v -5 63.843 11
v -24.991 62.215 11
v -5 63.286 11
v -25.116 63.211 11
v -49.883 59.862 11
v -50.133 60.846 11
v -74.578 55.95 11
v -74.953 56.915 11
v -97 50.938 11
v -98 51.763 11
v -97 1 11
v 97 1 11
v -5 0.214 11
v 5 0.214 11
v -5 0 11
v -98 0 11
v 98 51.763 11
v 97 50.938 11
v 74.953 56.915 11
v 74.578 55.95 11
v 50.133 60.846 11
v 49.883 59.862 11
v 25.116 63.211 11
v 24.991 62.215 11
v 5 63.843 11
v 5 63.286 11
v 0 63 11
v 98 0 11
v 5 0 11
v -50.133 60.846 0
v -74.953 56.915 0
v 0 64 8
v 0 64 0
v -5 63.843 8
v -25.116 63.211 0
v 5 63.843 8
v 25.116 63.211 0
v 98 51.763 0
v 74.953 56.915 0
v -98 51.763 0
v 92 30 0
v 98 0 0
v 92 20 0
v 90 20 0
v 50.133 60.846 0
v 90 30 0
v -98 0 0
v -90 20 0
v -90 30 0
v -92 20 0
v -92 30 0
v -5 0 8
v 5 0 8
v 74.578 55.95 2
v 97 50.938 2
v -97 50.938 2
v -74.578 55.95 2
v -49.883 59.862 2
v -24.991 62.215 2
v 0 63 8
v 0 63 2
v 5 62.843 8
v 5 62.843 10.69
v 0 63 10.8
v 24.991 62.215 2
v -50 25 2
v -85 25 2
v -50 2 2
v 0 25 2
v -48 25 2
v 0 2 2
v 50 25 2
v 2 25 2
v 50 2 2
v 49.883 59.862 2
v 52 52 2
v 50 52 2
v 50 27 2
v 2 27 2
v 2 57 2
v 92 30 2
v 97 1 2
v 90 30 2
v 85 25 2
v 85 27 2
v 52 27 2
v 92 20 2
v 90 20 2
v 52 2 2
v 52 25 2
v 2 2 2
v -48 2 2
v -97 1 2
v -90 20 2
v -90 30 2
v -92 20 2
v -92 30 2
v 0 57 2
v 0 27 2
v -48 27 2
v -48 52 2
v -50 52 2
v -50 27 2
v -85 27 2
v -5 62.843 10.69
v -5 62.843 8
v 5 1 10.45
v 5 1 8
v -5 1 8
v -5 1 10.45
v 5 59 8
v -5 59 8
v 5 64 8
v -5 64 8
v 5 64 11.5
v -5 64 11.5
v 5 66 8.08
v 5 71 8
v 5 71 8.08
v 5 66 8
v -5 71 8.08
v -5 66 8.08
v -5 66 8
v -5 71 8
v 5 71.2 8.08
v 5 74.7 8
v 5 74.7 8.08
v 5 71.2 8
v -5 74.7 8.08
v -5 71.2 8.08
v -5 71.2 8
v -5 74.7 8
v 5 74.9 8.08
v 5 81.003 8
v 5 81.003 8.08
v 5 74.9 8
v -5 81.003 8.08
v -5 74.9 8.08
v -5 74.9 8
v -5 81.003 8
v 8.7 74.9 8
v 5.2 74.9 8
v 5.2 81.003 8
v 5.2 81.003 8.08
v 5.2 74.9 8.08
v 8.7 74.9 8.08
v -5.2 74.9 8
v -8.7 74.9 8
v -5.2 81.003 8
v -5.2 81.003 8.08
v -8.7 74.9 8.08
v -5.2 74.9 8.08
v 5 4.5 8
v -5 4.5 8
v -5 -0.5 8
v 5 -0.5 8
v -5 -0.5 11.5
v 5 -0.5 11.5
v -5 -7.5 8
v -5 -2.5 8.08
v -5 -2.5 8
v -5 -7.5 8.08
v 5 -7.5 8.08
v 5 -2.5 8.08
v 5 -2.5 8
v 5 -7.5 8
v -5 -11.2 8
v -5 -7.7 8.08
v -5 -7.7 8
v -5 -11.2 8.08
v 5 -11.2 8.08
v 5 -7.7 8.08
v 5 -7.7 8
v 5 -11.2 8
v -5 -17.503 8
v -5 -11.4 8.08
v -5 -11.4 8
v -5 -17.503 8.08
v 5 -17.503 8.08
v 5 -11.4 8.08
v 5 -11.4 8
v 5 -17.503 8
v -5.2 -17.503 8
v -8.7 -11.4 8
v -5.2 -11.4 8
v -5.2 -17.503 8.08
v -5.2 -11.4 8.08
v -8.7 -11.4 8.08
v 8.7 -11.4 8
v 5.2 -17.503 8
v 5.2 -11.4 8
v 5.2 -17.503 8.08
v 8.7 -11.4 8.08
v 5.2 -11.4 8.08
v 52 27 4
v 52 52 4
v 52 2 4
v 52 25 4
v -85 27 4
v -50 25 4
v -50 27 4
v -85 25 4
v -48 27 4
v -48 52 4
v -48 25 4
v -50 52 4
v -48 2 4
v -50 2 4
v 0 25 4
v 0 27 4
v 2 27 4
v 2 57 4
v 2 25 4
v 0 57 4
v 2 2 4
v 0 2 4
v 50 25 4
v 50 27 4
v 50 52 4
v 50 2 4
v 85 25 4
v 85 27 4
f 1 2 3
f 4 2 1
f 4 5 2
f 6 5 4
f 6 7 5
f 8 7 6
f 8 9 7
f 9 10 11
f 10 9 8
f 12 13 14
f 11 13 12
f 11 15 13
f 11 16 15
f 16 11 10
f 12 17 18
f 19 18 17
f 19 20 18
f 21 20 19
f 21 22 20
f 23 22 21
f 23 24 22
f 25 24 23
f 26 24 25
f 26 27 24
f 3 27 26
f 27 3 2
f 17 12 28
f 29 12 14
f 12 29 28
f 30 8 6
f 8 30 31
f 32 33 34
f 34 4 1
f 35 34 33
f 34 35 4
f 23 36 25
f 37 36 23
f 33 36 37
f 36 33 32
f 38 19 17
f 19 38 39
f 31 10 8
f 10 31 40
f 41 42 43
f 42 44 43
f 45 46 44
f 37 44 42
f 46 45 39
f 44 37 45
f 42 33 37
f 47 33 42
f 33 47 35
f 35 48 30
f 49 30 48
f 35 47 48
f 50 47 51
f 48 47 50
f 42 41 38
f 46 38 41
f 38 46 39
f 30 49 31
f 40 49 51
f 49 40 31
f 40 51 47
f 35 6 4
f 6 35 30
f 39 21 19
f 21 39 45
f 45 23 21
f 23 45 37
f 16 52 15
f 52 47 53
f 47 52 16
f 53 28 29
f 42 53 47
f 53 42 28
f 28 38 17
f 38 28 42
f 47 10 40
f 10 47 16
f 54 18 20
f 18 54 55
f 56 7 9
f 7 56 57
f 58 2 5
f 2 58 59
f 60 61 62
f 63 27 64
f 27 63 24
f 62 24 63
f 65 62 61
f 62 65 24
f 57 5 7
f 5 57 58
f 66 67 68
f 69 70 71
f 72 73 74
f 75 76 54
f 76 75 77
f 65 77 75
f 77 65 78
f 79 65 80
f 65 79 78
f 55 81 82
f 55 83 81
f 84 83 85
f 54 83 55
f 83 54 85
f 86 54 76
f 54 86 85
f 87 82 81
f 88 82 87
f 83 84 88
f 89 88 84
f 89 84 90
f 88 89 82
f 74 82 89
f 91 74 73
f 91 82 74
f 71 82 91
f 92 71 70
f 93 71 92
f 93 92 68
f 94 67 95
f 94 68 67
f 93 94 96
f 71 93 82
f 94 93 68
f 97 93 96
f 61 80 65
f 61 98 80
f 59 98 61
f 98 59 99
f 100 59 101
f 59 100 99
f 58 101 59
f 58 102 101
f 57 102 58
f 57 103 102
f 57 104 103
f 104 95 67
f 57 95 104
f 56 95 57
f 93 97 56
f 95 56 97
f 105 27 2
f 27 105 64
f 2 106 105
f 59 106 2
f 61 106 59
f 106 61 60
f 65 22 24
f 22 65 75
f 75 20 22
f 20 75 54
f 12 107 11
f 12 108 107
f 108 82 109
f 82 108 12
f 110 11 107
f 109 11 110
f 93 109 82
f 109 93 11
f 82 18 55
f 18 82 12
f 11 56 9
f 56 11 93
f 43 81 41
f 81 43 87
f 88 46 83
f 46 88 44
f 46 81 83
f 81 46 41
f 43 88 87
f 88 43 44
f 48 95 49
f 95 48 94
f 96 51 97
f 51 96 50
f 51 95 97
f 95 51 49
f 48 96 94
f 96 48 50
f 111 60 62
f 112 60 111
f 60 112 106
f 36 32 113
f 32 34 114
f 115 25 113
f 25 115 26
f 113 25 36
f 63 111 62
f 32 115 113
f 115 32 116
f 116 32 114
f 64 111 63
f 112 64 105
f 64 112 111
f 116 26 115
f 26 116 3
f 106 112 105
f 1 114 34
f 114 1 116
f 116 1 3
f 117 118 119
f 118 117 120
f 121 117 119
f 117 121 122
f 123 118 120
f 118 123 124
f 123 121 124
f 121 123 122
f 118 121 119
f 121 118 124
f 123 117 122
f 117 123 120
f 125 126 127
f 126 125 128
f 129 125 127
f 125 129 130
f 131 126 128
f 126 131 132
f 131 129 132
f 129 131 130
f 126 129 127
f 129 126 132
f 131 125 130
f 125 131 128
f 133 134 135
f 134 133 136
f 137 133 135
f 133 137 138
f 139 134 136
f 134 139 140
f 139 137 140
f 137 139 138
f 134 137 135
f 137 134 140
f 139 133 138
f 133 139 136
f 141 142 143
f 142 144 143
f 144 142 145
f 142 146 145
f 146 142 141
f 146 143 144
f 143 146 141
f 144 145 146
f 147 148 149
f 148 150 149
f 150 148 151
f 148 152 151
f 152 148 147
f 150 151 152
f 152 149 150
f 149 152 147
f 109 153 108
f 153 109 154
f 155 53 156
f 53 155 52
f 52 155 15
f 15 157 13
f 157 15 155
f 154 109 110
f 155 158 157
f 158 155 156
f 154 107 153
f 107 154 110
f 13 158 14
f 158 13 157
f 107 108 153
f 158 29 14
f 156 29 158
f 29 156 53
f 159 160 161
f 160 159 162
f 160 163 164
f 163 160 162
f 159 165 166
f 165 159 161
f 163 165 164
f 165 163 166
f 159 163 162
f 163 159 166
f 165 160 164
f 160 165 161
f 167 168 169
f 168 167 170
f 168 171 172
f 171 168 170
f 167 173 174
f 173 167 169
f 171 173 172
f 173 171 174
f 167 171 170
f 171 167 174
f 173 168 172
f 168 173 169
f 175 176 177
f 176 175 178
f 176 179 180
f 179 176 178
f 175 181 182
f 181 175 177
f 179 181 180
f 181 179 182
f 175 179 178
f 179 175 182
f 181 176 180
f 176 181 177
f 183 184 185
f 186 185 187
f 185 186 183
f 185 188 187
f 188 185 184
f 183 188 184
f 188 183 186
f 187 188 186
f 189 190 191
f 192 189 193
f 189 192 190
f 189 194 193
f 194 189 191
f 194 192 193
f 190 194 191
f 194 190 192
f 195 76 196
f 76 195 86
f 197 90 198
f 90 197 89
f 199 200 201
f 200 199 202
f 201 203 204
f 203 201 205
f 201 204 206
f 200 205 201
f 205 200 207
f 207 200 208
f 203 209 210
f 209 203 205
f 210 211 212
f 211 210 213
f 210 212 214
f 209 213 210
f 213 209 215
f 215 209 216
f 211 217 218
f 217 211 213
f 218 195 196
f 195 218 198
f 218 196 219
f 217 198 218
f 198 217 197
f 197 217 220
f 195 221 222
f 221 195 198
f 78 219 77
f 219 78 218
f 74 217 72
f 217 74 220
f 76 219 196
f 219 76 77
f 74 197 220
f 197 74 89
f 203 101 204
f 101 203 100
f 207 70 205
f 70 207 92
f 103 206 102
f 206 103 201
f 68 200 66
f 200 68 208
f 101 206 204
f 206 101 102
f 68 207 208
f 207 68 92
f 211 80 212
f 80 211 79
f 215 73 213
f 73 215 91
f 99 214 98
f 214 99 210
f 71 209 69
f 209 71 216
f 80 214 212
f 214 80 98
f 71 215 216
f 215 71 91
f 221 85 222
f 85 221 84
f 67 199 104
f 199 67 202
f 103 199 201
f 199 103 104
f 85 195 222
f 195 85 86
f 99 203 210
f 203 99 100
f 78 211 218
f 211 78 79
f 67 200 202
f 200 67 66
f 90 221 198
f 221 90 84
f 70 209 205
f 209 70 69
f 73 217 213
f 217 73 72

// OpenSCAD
// Longitud de cuerda
c = 193/2;
// Longitud de semi-cuerda
a = 97;
// Distancia entre cuerda y borde exterior
b = 24;
// ancho total
d = 64;

// grosor
g = 2;

// Calculo del radio
// La pendiente de la semicuerda es c/b
// r^2 = c^2 + (c * c/b)^2
r = sqrt(c*c + ((c*c/b)*(c*c/b)));

module base(rad,grueso){
    difference(){
        translate([0,-rad+d-grueso/2,0]) difference(){
            cylinder(h=11, r=rad, center=false, $fn=100);
            translate([-1.5*rad,-rad-d+grueso,-5]) cube([3*rad,2*rad,30]);
        }
        union(){
        translate([98-grueso/2,-5,-5]) cube([400,80,60]);
        translate([-400-(98-grueso/2),-5,-5]) cube([400,80,60]);
        }
    }
}

module prism(l, w, h){
       polyhedron(
               points=[[0,0,0], [l,0,0], [l,w,0], [0,w,0], [0,w,h], [l,w,h]],
               faces=[[0,1,2,3],[5,4,3,2],[0,4,5,1],[0,3,4],[5,2,1]]
               );
       
       // preview unfolded (do not include in your function
       z = 0.08;
       separation = 2;
       border = .2;
       translate([0,w+separation,0])
           cube([l,w,z]);
       translate([0,w+separation+w+border,0])
           cube([l,h,z]);
       translate([0,w+separation+w+border+h+border,0])
           cube([l,sqrt(w*w+h*h),z]);
       translate([l+border,w+separation+w+border+h+border,0])
           polyhedron(
                   points=[[0,0,0],[h,0,0],[0,sqrt(w*w+h*h),0], [0,0,z],[h,0,z],[0,sqrt(w*w+h*h),z]],
                   faces=[[0,1,2], [3,5,4], [0,3,4,1], [1,4,5,2], [2,5,3,0]]
                   );
       translate([0-border,w+separation+w+border+h+border,0])
           polyhedron(
                   points=[[0,0,0],[0-h,0,0],[0,sqrt(w*w+h*h),0], [0,0,z],[0-h,0,z],[0,sqrt(w*w+h*h),z]],
                   faces=[[1,0,2],[5,3,4],[0,1,4,3],[1,2,5,4],[2,0,3,5]]
                   );
       }

difference(){
    base(round(r),0);
    union(){
        translate([0,0,2]) base(round(r)-g, g);
        //translate([0,0,-10]) base(round(r)-g, g);
        translate([90,20,-25]) cube([2,10,50]);
        translate([-92,20,-25]) cube([2,10,50]);
    }
}
translate([50,2,2]) cube([2,50,2]);
translate([-50,2,2]) cube([2,50,2]);
translate([0,2,2]) cube([2,55,2]);
translate([-85,25,2]) cube([170,2,2]);
translate([-5,d-5,8]) prism(10,5,3.5);
translate([5,4.5,8]) rotate(180) prism(10,5,3.5);
